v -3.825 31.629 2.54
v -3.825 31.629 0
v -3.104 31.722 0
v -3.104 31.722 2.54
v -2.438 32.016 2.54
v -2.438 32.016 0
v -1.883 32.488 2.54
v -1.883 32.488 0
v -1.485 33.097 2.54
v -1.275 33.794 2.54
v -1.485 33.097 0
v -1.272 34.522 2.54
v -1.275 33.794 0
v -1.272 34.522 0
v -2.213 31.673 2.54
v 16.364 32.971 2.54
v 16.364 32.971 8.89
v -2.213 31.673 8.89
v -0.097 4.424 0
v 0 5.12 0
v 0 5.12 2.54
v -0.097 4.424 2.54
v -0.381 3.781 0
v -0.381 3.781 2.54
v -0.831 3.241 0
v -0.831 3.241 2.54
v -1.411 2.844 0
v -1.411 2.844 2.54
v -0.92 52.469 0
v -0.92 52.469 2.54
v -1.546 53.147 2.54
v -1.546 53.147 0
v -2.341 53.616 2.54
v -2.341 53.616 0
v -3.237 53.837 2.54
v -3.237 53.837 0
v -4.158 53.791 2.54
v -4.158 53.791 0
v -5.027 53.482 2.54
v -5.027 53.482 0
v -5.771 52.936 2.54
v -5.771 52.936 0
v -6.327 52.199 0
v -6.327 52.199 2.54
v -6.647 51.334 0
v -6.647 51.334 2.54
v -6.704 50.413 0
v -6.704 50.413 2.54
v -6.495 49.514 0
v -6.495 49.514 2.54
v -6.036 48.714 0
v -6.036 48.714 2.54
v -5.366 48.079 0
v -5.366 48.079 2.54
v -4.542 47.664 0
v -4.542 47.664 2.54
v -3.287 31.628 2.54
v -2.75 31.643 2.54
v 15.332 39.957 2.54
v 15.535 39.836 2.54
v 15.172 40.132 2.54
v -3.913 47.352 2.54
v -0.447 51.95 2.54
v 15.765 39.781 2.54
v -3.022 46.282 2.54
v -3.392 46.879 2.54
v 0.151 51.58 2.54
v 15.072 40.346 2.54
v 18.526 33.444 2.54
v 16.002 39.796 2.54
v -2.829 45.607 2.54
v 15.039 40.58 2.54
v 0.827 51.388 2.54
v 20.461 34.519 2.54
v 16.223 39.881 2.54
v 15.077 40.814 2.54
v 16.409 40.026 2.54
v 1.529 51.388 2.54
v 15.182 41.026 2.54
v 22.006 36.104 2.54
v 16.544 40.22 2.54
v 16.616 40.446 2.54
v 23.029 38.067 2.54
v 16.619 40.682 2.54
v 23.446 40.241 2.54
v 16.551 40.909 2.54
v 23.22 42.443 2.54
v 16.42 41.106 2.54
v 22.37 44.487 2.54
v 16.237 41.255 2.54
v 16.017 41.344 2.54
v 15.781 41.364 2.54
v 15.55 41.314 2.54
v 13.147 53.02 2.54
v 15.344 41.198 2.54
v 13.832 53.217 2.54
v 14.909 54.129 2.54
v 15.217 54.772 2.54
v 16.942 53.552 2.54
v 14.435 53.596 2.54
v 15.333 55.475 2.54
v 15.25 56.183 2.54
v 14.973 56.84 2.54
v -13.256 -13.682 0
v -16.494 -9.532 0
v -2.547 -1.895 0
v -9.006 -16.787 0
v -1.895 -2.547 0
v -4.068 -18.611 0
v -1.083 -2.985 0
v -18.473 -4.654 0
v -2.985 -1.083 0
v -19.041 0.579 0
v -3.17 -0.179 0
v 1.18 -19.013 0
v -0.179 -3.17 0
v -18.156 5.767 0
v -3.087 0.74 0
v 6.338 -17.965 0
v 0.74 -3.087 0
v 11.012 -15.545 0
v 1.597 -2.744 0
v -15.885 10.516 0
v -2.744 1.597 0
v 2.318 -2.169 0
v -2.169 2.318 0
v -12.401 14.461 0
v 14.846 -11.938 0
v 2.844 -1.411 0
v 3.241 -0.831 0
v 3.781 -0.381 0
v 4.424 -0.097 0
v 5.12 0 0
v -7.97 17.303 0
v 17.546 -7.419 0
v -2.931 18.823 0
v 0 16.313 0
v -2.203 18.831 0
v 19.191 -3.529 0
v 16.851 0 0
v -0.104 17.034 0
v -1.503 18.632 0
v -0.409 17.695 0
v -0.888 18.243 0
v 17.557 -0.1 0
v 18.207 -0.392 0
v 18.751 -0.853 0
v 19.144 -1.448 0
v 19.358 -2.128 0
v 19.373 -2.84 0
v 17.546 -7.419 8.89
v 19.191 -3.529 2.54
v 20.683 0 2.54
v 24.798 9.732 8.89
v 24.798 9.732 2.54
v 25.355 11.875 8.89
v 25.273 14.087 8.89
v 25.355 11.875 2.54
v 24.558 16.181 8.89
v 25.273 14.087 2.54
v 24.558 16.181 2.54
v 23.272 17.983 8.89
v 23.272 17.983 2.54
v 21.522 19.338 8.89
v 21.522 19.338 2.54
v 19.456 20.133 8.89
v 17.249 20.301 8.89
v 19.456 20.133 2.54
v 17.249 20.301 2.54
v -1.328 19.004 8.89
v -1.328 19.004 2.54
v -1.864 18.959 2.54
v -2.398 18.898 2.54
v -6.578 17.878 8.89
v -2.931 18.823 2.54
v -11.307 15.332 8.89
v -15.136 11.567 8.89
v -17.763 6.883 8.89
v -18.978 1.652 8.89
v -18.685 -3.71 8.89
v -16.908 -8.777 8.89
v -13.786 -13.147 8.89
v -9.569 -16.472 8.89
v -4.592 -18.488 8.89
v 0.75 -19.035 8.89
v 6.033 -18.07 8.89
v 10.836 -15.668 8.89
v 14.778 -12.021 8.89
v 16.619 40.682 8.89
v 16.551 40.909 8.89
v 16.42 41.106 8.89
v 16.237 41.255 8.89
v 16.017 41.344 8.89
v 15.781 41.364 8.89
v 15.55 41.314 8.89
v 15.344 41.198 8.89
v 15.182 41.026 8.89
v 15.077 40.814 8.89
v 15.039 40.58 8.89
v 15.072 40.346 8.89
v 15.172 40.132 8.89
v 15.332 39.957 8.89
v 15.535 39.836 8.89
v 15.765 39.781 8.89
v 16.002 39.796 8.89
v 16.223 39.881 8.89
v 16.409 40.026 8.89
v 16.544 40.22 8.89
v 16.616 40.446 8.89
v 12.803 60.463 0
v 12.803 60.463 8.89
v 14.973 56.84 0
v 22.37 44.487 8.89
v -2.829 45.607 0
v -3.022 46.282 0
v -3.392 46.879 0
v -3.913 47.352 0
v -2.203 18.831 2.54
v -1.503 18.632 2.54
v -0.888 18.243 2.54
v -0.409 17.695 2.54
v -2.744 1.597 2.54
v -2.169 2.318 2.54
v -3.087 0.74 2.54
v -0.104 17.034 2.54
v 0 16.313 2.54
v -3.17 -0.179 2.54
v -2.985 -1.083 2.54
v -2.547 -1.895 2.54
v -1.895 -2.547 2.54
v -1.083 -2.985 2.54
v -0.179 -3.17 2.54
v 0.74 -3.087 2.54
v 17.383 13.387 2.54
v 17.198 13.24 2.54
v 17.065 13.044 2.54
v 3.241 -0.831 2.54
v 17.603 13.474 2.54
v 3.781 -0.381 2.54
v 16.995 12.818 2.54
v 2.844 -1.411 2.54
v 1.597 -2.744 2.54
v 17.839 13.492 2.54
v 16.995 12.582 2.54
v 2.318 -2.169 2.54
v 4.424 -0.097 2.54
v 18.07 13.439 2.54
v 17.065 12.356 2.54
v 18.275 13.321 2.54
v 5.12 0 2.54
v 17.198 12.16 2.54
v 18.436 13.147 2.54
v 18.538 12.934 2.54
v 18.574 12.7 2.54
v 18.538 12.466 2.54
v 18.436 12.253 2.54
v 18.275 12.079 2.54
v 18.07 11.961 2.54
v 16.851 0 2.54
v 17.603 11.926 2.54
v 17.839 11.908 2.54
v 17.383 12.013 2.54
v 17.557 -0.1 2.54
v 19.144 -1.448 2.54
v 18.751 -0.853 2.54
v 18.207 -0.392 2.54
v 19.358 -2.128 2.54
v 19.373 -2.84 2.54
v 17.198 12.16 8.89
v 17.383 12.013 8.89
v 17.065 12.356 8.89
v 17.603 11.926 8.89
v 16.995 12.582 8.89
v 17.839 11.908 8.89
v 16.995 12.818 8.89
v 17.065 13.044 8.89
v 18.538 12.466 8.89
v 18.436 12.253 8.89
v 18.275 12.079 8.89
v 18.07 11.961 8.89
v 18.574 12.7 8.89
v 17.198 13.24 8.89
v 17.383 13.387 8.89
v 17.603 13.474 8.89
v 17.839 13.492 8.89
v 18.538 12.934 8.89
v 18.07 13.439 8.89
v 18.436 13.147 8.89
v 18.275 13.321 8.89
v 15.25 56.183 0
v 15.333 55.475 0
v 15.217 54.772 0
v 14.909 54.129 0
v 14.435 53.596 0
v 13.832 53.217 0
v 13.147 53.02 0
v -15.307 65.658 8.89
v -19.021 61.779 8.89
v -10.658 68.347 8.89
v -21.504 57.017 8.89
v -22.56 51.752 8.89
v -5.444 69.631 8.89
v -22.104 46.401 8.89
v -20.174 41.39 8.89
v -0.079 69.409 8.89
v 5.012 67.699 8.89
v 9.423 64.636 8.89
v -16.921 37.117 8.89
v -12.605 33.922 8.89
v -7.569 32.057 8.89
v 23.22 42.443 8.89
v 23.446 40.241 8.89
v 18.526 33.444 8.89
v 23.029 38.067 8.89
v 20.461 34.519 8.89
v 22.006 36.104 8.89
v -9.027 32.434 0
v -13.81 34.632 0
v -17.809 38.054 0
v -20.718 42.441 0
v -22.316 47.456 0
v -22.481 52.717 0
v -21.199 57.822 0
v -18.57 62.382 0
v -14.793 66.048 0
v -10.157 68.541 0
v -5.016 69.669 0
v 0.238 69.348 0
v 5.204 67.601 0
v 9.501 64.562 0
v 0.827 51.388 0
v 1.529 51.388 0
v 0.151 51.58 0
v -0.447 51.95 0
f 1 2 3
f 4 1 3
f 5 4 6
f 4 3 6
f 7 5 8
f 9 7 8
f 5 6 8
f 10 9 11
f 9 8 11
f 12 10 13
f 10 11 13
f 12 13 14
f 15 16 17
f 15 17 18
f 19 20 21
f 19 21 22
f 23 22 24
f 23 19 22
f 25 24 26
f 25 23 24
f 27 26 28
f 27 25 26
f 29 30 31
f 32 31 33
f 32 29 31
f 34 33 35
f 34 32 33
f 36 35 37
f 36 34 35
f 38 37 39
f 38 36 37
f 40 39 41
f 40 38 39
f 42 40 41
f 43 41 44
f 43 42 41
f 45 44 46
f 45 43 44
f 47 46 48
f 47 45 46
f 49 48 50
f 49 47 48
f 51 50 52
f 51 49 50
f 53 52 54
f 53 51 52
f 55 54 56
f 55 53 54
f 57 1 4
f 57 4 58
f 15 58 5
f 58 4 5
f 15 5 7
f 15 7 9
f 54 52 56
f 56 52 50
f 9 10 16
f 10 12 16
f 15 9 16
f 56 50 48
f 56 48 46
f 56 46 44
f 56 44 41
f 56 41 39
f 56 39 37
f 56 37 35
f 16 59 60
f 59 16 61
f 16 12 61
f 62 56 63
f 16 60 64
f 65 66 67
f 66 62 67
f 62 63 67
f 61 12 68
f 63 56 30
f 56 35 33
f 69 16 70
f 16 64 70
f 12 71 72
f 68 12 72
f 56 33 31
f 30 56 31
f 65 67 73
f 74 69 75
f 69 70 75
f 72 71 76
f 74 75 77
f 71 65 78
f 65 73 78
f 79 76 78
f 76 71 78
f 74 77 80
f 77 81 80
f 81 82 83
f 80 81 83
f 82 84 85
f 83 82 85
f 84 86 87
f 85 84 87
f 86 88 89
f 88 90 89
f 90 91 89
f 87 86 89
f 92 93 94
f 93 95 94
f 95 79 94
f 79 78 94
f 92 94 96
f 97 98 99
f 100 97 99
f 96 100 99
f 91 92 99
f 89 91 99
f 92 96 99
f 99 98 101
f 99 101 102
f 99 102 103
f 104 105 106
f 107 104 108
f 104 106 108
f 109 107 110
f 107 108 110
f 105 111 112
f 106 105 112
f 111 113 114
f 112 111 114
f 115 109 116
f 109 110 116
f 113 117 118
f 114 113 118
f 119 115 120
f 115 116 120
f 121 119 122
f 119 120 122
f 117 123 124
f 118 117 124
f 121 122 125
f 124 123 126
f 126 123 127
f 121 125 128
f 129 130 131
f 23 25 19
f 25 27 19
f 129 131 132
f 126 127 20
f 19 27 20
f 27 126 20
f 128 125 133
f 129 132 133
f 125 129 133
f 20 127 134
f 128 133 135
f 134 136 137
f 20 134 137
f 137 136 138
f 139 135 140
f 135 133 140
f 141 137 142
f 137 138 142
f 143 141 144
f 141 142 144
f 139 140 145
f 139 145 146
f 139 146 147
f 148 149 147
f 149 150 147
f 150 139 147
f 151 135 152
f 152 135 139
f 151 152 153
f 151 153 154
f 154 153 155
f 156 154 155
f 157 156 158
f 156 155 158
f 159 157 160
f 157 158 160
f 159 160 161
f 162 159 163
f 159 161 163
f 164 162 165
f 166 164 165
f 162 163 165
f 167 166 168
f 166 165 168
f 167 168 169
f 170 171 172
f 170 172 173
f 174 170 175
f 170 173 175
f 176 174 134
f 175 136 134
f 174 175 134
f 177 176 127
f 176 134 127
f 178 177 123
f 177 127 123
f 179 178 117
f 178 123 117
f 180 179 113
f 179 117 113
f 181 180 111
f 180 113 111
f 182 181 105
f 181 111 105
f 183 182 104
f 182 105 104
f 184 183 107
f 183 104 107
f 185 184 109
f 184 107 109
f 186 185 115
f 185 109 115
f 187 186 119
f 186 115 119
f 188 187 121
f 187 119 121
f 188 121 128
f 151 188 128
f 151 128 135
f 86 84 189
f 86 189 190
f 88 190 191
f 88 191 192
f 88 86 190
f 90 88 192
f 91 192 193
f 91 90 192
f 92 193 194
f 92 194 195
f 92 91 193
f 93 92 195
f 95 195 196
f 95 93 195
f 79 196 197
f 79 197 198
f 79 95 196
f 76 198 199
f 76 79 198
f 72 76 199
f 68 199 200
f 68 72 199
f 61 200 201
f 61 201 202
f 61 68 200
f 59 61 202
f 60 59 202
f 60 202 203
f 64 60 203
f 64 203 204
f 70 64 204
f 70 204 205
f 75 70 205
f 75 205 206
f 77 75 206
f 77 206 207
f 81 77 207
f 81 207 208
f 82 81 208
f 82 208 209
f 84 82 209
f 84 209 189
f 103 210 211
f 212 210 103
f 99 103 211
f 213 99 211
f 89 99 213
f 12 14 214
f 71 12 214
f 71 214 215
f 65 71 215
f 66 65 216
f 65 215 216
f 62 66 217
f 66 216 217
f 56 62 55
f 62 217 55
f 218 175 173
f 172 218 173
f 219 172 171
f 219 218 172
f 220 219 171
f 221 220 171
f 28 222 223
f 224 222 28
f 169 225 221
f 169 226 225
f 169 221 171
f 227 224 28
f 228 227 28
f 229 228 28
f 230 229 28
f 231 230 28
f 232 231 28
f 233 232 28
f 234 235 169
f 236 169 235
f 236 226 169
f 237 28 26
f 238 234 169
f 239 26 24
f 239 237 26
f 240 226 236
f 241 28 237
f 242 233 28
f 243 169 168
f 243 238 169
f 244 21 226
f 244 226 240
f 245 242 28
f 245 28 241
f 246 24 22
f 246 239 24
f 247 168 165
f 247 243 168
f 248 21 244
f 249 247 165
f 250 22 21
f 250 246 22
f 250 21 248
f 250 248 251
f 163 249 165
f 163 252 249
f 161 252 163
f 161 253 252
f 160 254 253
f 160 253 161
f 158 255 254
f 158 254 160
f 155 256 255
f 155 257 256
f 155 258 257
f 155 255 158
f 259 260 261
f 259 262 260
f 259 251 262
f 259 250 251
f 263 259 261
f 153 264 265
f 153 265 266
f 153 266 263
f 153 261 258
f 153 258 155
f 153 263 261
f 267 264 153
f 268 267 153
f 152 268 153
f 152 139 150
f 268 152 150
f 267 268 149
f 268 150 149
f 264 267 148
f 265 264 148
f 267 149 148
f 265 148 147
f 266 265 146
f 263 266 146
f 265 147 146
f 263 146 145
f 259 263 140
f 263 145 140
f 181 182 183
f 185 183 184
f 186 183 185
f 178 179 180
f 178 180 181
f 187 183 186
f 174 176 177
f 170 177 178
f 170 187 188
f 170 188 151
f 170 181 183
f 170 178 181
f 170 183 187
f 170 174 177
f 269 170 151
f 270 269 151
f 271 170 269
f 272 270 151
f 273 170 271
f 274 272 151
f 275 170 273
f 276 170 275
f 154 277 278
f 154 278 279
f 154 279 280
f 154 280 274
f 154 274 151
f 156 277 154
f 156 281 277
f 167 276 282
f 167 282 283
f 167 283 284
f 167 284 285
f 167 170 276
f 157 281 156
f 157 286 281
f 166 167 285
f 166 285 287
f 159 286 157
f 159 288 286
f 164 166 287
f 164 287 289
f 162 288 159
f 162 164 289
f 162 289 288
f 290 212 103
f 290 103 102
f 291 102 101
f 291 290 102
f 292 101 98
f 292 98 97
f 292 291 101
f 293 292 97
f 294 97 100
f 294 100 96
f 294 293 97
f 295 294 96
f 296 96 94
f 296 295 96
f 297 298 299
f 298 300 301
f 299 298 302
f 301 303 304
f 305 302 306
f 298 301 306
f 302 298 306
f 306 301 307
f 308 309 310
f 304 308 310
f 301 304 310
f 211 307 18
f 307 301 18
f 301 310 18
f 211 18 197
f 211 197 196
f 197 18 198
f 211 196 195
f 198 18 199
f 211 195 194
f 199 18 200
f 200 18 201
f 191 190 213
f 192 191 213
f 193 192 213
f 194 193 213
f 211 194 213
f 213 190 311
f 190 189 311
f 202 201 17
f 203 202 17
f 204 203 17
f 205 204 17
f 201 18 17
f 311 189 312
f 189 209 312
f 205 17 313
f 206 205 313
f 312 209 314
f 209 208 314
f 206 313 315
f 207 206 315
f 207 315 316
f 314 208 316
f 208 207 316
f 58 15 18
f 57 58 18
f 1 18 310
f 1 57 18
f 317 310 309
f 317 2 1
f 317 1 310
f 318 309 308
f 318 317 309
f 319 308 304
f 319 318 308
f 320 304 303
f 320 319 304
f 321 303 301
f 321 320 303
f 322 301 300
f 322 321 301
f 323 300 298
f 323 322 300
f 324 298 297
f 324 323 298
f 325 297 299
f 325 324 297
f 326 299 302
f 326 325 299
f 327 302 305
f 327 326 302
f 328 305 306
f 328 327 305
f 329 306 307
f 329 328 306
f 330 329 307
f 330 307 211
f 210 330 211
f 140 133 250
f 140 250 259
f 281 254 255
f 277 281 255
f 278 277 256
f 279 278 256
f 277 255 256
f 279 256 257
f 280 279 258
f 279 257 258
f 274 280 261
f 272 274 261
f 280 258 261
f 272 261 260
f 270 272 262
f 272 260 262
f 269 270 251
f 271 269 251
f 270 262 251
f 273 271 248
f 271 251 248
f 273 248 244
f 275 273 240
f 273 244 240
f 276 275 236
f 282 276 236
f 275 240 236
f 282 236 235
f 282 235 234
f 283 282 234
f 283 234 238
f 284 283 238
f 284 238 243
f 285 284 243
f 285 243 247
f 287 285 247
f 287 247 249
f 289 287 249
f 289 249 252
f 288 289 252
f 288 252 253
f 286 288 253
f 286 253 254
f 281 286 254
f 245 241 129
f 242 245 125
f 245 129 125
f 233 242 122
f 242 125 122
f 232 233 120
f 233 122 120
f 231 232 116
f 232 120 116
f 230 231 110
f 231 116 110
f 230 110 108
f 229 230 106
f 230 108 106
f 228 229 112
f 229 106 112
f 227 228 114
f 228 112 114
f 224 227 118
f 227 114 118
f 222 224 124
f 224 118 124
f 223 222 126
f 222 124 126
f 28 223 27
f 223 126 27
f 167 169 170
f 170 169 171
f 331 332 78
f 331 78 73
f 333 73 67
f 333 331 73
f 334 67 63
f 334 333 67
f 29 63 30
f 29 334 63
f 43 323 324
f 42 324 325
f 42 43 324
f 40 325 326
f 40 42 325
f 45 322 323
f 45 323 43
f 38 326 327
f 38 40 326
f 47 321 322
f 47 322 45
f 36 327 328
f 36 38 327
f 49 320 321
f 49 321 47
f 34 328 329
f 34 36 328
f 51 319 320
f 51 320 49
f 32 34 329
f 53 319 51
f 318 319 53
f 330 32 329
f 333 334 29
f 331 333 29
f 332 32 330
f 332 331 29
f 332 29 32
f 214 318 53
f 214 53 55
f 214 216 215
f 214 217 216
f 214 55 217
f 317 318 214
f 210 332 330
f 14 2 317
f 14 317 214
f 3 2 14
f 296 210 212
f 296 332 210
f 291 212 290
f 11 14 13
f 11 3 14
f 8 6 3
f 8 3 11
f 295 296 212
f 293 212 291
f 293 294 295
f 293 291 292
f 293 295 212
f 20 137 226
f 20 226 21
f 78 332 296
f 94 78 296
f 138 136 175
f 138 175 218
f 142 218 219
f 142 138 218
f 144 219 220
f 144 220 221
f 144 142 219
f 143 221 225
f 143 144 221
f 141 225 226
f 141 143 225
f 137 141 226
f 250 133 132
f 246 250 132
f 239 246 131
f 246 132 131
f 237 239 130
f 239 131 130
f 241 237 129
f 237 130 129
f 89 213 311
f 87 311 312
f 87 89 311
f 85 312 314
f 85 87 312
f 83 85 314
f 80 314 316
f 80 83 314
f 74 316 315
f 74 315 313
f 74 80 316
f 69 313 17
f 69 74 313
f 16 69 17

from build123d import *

# Parameters (mm, degrees)
F1_DEPTH    = 8.89
F2_W        = 52.2928647697
F2_H        = 32.6345004141
F3_DEPTH    = 2.54
F4_R        = 3.175
F5_DEPTH    = 2.54
F6_R        = 0.79375
F7_DEPTH    = 6.351
F8_T1_DEPTH = 7.4013341754
F8_T3_DEPTH = 12.1194356419
F8_T5_DEPTH = 9.8986940254


# Not quite as in the source:
# - a fillet or chamfer that OpenCascade refuses, or shapes differently, is made with other operations: its cross-section is extruded or revolved along the edge and cut away or added


with BuildPart() as f1:
    # F0 (on Top) → F1 (new body)
    with BuildSketch(Plane.XY):
        with BuildLine():
            Line((17.2489482218, 20.3014724895), (-1.3276294456, 19.0036812238))
            ThreePointArc((-1.3276294456, 19.0036812238), (-15.5016226265, -11.0725875903), (17.5458726888, -7.4192217643))
            Line((17.5458726888, -7.4192217643), (24.7983490755, 9.7323112943))
            ThreePointArc((24.7983490755, 9.7323112943), (23.9806490506, 17.1290350361), (17.2489482218, 20.3014724895))
        make_face()
    extrude(amount=F1_DEPTH)

    # F2 (on face) → F3 (cut)
    with BuildSketch(Plane(origin=(0, 0, 0), x_dir=(1, 0, 0), z_dir=(0, 0, -1))):
        with Locations((26.1464323848, -16.3172502071)):
            Rectangle(F2_W, F2_H)
    extrude(amount=-F3_DEPTH, mode=Mode.SUBTRACT)

    # F4 (on face) → F5 (cut, through all)
    with BuildSketch(Plane(origin=(0, 0, 0), x_dir=(1, 0, 0), z_dir=(0, 0, -1))):
        Circle(F4_R)
    extrude(amount=-F5_DEPTH, mode=Mode.SUBTRACT)

    # F6 (on face) → F7 (cut, through all)
    with BuildSketch(Plane(origin=(0, 0, 2.54), x_dir=(1, 0, 0), z_dir=(0, 0, -1))):
        with Locations((17.78, -12.7)):
            Circle(F6_R)
    extrude(amount=-F7_DEPTH, mode=Mode.SUBTRACT)

    # F8: fillet of radius 2.54 on 4 edges, made by hand

    # F8_s2 → F8_t1 (cut)
    with BuildSketch(Plane.XY.offset(-4.8613341754)):
        with BuildLine():
            ThreePointArc((5.1195336702, 0), (3.7808361274, -0.3814150726), (2.8441853723, -1.4111111111))
            ThreePointArc((2.8441853723, -1.4111111111), (3.091190188, -0.7246849118), (3.175, 0))
            Line((3.175, 0), (5.1195336702, 0))
        make_face()
        with BuildLine():
            ThreePointArc((0, 5.1195336702), (-0.3814150726, 3.7808361274), (-1.4111111111, 2.8441853723))
            ThreePointArc((-1.4111111111, 2.8441853723), (-0.7246849118, 3.091190188), (0, 3.175))
            Line((0, 3.175), (0, 5.1195336702))
        make_face()
    extrude(amount=F8_T1_DEPTH, mode=Mode.SUBTRACT)

    # F8_s4 → F8_t3 (cut)
    with BuildSketch(Plane.XY.offset(-9.5794356419)):
        with BuildLine():
            ThreePointArc((19.1907446922, -3.5292295686), (18.9683971595, -1.1366189228), (16.8512950004, 0))
            Line((16.8512950004, 0), (20.6830692572, 0))
            Line((20.6830692572, 0), (19.1907446922, -3.5292295686))
        make_face()
    extrude(amount=F8_T3_DEPTH, mode=Mode.SUBTRACT)

    # F8_s6 → F8_t5 (cut)
    with BuildSketch(Plane.XY.offset(-7.3586940254)):
        with BuildLine():
            ThreePointArc((-2.9307692308, 18.8232062018), (-0.8878731656, 18.2427138692), (0, 16.3134453749))
            Line((0, 16.3134453749), (0.254, 16.3134453749))
            Line((0.254, 16.3134453749), (0.254, 19.0964316717))
            Line((0.254, 19.0964316717), (-0.0177017259, 19.349814088))
            ThreePointArc((-0.0177017259, 19.349814088), (-1.3453311715, 19.2570636401), (-2.9698461538, 19.0741822845))
            Line((-2.9698461538, 19.0741822845), (-2.9307692308, 18.8232062018))
        make_face()
    extrude(amount=F8_T5_DEPTH, mode=Mode.SUBTRACT)


with BuildPart() as f10_1:
    # F10: instance of F1
    add(f1.part.mirror(Plane(origin=(7.5181162396, 25.9871372646, 5.715), x_dir=(-0.9975685682, -0.0696918344, 0), z_dir=(-0.0696918344, 0.9975685682, 0))))


solid = Compound([f1.part, f10_1.part])
